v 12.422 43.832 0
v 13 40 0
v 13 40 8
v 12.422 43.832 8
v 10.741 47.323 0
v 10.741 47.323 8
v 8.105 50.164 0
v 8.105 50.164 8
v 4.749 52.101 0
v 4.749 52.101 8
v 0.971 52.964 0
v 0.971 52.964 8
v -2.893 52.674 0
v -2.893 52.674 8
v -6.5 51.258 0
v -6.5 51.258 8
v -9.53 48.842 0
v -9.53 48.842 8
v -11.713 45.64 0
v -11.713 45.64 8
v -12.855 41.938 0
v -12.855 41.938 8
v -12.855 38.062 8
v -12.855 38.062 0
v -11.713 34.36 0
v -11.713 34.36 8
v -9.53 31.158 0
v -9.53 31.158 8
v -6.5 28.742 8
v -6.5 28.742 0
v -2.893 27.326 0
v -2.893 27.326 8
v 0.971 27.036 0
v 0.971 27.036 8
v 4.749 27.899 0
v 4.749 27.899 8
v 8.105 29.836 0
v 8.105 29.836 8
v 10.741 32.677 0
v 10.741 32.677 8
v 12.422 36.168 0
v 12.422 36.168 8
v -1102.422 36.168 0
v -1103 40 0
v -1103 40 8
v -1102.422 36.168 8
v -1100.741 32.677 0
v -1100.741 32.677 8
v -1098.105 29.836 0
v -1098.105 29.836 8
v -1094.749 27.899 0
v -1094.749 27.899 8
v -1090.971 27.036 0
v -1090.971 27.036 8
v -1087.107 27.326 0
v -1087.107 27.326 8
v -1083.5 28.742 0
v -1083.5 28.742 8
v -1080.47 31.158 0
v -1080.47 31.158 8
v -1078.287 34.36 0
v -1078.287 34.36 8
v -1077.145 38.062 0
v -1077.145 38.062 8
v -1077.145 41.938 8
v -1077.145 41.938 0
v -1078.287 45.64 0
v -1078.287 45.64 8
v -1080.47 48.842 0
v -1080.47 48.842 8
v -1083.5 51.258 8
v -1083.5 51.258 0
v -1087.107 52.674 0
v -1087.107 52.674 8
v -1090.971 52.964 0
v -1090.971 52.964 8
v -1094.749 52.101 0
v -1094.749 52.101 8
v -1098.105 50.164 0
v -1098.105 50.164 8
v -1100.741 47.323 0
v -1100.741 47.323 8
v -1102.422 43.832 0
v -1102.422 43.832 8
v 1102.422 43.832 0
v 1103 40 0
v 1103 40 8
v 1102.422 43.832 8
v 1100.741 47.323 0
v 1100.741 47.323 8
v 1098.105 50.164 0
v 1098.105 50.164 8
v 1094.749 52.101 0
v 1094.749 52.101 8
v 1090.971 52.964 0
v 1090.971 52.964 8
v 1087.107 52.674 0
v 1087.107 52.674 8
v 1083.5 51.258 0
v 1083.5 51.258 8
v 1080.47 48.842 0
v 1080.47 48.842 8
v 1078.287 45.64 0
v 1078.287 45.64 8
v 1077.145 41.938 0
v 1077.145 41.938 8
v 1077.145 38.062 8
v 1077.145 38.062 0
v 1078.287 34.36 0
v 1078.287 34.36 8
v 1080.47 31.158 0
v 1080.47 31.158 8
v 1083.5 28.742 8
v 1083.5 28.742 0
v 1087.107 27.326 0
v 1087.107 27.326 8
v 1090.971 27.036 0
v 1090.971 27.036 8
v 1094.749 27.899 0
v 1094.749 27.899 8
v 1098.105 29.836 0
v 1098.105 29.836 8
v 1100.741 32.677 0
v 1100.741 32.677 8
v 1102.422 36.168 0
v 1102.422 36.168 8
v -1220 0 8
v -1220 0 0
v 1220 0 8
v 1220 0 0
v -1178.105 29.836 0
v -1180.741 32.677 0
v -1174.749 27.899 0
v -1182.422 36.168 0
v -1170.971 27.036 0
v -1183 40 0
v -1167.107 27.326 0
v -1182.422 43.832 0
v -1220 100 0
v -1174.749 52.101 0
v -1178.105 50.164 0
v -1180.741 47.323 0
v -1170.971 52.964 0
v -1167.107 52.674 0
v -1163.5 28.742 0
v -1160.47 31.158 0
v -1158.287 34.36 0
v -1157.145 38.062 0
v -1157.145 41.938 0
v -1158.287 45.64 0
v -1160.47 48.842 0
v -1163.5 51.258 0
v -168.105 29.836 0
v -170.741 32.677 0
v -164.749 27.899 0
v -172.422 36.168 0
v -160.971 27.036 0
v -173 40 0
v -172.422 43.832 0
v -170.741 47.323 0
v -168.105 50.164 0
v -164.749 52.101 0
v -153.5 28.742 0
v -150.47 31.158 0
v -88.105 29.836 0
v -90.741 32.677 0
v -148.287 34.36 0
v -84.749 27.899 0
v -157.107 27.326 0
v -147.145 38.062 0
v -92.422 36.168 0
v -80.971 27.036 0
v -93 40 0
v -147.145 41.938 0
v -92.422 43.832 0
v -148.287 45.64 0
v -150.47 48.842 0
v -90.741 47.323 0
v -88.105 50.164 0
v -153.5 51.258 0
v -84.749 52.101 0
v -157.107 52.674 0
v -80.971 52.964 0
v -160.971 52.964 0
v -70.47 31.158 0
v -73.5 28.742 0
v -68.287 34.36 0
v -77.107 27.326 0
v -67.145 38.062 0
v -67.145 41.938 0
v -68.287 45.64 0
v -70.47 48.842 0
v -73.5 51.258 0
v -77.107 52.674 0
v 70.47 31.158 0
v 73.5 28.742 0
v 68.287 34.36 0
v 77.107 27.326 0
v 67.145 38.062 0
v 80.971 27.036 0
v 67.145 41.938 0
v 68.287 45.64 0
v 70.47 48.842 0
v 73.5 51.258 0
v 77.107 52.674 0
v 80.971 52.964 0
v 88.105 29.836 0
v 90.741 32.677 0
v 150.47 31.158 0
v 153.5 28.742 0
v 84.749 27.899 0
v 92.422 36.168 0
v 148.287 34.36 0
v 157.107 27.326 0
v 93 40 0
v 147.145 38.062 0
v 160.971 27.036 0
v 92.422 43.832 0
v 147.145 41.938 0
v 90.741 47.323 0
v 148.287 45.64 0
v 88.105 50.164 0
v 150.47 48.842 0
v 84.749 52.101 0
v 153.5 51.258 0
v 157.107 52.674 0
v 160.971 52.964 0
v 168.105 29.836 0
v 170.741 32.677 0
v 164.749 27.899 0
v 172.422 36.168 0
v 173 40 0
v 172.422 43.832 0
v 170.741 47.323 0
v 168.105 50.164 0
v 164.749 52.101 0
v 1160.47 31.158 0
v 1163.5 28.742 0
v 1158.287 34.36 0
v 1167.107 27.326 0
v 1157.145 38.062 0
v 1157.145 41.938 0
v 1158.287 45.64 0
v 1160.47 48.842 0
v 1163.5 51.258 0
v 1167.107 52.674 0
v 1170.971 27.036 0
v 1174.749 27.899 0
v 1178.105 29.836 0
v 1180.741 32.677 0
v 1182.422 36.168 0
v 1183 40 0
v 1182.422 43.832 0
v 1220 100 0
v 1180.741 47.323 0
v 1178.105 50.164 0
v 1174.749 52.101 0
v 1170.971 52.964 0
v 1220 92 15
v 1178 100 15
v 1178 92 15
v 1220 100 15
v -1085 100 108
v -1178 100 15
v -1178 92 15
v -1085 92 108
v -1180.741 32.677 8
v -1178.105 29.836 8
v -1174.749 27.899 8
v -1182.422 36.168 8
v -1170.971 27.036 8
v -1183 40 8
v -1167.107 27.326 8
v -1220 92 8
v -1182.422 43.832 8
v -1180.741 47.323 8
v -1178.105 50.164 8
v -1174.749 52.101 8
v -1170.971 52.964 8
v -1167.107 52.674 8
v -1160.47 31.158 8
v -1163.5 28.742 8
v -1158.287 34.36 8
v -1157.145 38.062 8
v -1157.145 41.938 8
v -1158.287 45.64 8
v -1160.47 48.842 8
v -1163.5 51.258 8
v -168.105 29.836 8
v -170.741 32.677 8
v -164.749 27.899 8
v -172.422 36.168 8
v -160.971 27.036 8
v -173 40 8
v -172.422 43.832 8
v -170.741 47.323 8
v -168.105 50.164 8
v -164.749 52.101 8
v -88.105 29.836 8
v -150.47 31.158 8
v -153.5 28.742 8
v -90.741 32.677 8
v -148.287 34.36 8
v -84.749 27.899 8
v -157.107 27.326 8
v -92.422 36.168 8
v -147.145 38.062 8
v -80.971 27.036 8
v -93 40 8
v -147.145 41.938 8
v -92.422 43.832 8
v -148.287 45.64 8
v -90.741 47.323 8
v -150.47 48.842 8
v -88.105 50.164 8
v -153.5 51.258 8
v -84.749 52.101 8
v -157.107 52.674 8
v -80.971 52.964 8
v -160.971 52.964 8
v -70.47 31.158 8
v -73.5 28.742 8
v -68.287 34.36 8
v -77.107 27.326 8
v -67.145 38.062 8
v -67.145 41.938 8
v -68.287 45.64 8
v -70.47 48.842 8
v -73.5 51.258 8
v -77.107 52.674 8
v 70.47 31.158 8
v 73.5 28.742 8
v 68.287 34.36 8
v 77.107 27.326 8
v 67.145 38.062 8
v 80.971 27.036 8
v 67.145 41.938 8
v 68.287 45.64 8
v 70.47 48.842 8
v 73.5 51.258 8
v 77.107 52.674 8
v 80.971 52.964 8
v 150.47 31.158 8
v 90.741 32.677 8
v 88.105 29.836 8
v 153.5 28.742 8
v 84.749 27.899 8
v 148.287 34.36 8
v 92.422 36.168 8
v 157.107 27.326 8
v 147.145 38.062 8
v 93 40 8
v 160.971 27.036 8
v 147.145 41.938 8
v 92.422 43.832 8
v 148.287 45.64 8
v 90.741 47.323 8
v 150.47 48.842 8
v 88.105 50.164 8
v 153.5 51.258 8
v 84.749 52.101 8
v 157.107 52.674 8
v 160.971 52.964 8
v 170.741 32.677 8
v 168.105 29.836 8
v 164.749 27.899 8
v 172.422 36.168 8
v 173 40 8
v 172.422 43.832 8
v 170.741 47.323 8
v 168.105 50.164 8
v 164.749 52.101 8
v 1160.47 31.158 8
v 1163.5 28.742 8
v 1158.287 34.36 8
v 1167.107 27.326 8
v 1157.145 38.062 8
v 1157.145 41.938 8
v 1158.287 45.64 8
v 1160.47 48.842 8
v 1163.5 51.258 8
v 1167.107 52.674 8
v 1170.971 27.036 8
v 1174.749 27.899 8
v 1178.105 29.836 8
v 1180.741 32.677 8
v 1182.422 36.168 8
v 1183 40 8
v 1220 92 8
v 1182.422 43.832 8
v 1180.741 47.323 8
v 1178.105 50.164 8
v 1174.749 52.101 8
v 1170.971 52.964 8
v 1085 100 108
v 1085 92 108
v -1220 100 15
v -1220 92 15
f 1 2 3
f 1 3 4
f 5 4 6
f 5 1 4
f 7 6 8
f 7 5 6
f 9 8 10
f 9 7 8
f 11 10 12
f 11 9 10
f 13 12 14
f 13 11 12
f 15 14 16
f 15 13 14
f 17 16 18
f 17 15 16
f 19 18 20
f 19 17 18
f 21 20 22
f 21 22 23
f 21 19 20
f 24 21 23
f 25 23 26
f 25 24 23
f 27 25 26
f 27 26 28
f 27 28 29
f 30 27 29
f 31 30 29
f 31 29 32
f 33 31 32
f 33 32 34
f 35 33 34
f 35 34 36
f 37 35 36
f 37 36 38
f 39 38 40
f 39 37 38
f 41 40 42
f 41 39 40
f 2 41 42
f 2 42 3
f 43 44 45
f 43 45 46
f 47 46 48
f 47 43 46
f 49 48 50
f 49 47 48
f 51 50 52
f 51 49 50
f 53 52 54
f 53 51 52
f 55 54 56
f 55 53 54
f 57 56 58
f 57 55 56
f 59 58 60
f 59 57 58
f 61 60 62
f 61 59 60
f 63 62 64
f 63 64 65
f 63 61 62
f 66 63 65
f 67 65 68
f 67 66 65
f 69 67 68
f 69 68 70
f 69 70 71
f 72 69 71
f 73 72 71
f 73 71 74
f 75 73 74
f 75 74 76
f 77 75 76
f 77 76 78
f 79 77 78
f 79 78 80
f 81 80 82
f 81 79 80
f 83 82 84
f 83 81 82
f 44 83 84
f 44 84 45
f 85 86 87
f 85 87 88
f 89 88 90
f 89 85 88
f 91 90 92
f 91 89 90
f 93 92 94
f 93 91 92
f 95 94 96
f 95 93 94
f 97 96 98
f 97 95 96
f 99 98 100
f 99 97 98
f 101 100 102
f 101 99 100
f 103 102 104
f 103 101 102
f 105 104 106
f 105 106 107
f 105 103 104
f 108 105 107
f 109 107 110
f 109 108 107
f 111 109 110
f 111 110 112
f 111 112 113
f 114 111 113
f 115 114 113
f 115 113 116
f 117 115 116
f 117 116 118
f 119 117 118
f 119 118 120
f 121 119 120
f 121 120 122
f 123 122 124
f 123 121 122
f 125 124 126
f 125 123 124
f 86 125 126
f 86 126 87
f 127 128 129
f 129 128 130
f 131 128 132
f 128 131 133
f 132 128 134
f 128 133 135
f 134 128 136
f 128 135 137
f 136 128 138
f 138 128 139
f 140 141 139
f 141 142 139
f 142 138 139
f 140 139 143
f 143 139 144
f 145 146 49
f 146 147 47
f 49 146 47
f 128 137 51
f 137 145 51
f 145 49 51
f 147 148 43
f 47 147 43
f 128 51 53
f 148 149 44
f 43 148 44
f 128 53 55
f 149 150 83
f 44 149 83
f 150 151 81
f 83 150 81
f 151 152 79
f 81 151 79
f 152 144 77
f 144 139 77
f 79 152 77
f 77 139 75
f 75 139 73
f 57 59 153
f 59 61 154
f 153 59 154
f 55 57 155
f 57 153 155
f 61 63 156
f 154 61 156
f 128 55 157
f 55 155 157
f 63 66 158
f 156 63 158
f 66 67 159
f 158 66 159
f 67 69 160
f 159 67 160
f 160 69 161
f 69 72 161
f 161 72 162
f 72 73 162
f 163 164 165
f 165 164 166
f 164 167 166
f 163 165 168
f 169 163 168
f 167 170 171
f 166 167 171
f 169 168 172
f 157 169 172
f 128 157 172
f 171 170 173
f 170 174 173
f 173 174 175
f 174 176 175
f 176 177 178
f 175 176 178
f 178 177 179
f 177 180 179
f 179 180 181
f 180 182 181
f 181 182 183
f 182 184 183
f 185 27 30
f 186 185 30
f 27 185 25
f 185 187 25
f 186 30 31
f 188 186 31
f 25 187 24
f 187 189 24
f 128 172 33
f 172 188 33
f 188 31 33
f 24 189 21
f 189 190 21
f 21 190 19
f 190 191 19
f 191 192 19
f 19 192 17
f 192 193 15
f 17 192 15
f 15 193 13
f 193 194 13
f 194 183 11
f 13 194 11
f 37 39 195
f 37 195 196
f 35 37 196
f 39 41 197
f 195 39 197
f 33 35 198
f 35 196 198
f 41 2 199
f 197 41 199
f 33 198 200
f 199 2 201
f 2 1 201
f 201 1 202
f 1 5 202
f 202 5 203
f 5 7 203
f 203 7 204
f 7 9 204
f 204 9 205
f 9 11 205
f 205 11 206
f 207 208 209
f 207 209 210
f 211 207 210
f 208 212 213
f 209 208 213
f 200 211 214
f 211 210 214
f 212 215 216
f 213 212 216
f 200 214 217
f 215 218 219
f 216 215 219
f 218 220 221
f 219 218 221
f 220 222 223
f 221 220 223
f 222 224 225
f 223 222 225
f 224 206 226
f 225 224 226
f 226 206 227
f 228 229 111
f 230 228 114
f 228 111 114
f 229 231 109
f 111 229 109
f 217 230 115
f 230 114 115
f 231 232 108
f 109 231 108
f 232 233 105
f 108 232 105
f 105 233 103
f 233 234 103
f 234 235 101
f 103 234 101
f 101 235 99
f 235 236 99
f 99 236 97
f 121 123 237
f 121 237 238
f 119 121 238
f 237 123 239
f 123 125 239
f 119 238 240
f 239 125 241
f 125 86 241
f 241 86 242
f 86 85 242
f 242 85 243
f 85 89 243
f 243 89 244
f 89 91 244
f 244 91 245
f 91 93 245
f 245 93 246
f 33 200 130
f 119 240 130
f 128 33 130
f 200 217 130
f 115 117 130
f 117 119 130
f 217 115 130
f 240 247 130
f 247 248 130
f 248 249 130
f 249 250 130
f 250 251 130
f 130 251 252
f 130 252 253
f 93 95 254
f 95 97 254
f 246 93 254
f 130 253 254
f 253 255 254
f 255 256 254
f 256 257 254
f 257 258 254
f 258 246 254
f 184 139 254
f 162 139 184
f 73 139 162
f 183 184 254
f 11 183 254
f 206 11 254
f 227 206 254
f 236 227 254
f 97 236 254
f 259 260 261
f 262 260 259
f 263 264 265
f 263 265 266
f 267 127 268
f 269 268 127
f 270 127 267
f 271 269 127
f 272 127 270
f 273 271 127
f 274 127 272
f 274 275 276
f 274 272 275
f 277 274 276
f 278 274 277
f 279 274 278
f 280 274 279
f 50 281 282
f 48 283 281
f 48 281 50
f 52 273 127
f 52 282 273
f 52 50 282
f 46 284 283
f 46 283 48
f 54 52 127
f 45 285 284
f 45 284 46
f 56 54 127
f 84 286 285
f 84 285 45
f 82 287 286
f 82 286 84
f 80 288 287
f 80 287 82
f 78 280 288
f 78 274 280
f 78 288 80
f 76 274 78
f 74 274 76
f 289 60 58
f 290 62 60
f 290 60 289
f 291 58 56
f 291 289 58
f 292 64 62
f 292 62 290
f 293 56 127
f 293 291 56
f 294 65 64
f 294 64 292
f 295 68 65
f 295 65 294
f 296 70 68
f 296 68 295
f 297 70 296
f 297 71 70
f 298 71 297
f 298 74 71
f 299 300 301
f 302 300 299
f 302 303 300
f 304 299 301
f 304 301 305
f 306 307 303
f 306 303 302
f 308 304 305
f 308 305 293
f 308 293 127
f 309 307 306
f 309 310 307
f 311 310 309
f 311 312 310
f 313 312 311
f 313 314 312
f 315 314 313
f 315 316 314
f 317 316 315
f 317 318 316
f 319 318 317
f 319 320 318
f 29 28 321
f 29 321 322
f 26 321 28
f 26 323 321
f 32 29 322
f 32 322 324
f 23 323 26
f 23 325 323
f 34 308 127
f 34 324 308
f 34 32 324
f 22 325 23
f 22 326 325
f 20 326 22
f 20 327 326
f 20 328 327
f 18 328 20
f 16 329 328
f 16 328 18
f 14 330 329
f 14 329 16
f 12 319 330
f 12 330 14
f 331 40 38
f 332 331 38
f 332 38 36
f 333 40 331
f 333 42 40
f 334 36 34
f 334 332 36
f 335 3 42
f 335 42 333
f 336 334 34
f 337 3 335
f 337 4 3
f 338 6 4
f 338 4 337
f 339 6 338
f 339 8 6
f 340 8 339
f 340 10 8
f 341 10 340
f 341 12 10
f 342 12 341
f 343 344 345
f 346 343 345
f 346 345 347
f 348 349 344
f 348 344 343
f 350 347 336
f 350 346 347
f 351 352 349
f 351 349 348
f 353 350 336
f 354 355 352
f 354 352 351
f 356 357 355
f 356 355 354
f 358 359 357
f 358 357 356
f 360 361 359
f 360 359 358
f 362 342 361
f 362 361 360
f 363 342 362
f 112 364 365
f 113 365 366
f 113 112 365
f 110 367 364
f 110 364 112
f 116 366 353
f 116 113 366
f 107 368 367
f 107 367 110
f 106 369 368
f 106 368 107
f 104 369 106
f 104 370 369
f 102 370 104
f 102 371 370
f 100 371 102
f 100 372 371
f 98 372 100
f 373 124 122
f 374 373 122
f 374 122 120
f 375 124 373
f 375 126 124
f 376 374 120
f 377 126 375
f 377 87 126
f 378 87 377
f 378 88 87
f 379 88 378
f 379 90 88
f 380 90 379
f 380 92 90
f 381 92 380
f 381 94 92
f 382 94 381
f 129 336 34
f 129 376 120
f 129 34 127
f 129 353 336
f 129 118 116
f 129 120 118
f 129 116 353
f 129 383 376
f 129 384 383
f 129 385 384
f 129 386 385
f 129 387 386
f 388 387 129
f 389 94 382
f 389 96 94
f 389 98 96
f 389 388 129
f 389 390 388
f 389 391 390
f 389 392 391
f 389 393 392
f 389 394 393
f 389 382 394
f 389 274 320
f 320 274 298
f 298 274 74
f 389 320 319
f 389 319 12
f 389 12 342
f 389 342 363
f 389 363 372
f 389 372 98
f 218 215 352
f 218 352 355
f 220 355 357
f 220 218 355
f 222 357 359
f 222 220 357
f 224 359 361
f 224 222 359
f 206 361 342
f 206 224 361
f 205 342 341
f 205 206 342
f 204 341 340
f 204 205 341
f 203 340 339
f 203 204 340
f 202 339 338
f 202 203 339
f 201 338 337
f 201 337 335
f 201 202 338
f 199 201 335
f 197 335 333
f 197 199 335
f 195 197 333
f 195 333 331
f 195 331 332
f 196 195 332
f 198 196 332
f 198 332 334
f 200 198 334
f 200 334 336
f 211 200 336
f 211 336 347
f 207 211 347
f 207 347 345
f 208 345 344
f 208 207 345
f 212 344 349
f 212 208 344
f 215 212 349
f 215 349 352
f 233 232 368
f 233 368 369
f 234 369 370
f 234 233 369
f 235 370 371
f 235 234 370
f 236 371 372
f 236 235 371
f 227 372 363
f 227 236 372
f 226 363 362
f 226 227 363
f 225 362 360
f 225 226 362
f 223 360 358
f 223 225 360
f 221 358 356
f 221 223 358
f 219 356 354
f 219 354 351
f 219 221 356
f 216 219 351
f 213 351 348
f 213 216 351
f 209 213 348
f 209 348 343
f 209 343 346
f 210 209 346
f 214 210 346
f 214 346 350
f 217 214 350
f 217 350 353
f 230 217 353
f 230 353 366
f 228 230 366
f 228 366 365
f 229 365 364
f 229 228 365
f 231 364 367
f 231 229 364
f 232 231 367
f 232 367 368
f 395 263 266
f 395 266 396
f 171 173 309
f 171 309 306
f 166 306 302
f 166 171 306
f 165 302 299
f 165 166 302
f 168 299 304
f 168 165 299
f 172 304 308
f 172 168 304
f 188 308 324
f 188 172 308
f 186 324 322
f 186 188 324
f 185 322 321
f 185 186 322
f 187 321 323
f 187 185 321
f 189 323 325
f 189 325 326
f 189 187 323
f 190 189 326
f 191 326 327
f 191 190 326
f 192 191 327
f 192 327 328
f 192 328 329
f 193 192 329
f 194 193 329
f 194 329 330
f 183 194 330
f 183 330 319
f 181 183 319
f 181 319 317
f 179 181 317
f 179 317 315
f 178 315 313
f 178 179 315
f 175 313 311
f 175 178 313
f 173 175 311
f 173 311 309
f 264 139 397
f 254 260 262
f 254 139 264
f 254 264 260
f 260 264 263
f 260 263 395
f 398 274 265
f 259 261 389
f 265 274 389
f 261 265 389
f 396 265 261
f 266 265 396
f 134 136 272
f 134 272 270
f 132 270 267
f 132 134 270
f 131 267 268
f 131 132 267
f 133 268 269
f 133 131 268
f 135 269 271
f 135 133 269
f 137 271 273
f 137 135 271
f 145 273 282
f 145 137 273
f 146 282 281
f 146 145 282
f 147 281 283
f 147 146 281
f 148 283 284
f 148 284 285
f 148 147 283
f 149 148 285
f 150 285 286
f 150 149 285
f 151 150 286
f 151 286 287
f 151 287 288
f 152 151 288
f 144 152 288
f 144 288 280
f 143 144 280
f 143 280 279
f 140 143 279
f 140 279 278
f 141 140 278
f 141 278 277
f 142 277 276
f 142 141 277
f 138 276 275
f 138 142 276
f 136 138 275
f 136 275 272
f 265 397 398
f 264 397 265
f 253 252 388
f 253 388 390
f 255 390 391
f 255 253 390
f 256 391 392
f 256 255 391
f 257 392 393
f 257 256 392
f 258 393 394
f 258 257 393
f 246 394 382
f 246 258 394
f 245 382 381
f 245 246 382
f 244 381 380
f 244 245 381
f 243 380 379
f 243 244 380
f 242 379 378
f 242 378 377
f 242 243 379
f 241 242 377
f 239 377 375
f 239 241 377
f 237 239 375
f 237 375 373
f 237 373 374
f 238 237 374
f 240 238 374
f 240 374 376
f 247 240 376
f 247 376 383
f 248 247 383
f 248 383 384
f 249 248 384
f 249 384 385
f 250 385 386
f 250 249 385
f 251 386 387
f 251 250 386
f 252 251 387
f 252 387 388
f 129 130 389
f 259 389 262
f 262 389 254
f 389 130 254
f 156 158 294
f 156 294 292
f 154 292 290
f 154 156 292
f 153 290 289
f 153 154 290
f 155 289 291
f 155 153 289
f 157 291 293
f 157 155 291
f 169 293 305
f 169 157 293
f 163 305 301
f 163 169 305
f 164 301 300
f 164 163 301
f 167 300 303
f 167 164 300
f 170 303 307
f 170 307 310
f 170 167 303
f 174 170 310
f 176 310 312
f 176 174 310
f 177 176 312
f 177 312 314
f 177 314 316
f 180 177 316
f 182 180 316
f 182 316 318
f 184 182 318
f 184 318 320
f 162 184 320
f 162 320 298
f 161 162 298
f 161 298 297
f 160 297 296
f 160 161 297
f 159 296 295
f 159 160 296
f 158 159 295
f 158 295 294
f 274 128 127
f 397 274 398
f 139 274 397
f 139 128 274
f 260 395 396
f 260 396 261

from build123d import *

# Parameters (mm, degrees)
SKETCH_1_W          = 2440
SKETCH_1_H          = 100
SKETCH_1_R          = 13
EXTRUDE_710_DEPTH   = 8
SKETCH_2_W          = 2440
SKETCH_2_H          = 8
EXTRUDE_1_DEPTH     = 100
CUT_EXTRUDE_1_DEPTH = 1229.846613699


with BuildPart() as part:
    # 草图1 → Extrude 710 (new body)
    with BuildSketch(Plane.XY):
        with Locations((0, 50)):
            Rectangle(SKETCH_1_W, SKETCH_1_H)
        with Locations((1090, 40)):
            Circle(SKETCH_1_R, mode=Mode.SUBTRACT)
        with Locations((1170, 40)):
            Circle(SKETCH_1_R, mode=Mode.SUBTRACT)
        with Locations(Location((-1170, 40, 0), (0, 0, 180))):
            Circle(SKETCH_1_R, mode=Mode.SUBTRACT)
        with Locations(Location((-1090, 40, 0), (0, 0, 180))):
            Circle(SKETCH_1_R, mode=Mode.SUBTRACT)
        with Locations((0, 40)):
            Circle(SKETCH_1_R, mode=Mode.SUBTRACT)
        with Locations((80, 40)):
            Circle(SKETCH_1_R, mode=Mode.SUBTRACT)
        with Locations((160, 40)):
            Circle(SKETCH_1_R, mode=Mode.SUBTRACT)
        with Locations(Location((-160, 40, 0), (0, 0, 180))):
            Circle(SKETCH_1_R, mode=Mode.SUBTRACT)
        with Locations(Location((-80, 40, 0), (0, 0, 180))):
            Circle(SKETCH_1_R, mode=Mode.SUBTRACT)
    extrude(amount=EXTRUDE_710_DEPTH)

    # 草图2 → 凸台-拉伸1 (add)
    with BuildSketch(Plane.XY.offset(8)):
        with Locations((0, 96)):
            Rectangle(SKETCH_2_W, SKETCH_2_H)
    extrude(amount=EXTRUDE_1_DEPTH)

    # 草图3 → 切除-拉伸1 (cut, through all)
    with BuildSketch(Plane(origin=(0, 100, 0), x_dir=(-1, 0, 0), z_dir=(0, 1, 0))):
        Polygon((-1085, 108), (-1178, 15), (-1220, 15), (-1220, 108), align=None)
        Polygon((1220, 15), (1178, 15), (1085, 108), (1220, 108), align=None)
    extrude(amount=-CUT_EXTRUDE_1_DEPTH, mode=Mode.SUBTRACT)


solid = part.part
